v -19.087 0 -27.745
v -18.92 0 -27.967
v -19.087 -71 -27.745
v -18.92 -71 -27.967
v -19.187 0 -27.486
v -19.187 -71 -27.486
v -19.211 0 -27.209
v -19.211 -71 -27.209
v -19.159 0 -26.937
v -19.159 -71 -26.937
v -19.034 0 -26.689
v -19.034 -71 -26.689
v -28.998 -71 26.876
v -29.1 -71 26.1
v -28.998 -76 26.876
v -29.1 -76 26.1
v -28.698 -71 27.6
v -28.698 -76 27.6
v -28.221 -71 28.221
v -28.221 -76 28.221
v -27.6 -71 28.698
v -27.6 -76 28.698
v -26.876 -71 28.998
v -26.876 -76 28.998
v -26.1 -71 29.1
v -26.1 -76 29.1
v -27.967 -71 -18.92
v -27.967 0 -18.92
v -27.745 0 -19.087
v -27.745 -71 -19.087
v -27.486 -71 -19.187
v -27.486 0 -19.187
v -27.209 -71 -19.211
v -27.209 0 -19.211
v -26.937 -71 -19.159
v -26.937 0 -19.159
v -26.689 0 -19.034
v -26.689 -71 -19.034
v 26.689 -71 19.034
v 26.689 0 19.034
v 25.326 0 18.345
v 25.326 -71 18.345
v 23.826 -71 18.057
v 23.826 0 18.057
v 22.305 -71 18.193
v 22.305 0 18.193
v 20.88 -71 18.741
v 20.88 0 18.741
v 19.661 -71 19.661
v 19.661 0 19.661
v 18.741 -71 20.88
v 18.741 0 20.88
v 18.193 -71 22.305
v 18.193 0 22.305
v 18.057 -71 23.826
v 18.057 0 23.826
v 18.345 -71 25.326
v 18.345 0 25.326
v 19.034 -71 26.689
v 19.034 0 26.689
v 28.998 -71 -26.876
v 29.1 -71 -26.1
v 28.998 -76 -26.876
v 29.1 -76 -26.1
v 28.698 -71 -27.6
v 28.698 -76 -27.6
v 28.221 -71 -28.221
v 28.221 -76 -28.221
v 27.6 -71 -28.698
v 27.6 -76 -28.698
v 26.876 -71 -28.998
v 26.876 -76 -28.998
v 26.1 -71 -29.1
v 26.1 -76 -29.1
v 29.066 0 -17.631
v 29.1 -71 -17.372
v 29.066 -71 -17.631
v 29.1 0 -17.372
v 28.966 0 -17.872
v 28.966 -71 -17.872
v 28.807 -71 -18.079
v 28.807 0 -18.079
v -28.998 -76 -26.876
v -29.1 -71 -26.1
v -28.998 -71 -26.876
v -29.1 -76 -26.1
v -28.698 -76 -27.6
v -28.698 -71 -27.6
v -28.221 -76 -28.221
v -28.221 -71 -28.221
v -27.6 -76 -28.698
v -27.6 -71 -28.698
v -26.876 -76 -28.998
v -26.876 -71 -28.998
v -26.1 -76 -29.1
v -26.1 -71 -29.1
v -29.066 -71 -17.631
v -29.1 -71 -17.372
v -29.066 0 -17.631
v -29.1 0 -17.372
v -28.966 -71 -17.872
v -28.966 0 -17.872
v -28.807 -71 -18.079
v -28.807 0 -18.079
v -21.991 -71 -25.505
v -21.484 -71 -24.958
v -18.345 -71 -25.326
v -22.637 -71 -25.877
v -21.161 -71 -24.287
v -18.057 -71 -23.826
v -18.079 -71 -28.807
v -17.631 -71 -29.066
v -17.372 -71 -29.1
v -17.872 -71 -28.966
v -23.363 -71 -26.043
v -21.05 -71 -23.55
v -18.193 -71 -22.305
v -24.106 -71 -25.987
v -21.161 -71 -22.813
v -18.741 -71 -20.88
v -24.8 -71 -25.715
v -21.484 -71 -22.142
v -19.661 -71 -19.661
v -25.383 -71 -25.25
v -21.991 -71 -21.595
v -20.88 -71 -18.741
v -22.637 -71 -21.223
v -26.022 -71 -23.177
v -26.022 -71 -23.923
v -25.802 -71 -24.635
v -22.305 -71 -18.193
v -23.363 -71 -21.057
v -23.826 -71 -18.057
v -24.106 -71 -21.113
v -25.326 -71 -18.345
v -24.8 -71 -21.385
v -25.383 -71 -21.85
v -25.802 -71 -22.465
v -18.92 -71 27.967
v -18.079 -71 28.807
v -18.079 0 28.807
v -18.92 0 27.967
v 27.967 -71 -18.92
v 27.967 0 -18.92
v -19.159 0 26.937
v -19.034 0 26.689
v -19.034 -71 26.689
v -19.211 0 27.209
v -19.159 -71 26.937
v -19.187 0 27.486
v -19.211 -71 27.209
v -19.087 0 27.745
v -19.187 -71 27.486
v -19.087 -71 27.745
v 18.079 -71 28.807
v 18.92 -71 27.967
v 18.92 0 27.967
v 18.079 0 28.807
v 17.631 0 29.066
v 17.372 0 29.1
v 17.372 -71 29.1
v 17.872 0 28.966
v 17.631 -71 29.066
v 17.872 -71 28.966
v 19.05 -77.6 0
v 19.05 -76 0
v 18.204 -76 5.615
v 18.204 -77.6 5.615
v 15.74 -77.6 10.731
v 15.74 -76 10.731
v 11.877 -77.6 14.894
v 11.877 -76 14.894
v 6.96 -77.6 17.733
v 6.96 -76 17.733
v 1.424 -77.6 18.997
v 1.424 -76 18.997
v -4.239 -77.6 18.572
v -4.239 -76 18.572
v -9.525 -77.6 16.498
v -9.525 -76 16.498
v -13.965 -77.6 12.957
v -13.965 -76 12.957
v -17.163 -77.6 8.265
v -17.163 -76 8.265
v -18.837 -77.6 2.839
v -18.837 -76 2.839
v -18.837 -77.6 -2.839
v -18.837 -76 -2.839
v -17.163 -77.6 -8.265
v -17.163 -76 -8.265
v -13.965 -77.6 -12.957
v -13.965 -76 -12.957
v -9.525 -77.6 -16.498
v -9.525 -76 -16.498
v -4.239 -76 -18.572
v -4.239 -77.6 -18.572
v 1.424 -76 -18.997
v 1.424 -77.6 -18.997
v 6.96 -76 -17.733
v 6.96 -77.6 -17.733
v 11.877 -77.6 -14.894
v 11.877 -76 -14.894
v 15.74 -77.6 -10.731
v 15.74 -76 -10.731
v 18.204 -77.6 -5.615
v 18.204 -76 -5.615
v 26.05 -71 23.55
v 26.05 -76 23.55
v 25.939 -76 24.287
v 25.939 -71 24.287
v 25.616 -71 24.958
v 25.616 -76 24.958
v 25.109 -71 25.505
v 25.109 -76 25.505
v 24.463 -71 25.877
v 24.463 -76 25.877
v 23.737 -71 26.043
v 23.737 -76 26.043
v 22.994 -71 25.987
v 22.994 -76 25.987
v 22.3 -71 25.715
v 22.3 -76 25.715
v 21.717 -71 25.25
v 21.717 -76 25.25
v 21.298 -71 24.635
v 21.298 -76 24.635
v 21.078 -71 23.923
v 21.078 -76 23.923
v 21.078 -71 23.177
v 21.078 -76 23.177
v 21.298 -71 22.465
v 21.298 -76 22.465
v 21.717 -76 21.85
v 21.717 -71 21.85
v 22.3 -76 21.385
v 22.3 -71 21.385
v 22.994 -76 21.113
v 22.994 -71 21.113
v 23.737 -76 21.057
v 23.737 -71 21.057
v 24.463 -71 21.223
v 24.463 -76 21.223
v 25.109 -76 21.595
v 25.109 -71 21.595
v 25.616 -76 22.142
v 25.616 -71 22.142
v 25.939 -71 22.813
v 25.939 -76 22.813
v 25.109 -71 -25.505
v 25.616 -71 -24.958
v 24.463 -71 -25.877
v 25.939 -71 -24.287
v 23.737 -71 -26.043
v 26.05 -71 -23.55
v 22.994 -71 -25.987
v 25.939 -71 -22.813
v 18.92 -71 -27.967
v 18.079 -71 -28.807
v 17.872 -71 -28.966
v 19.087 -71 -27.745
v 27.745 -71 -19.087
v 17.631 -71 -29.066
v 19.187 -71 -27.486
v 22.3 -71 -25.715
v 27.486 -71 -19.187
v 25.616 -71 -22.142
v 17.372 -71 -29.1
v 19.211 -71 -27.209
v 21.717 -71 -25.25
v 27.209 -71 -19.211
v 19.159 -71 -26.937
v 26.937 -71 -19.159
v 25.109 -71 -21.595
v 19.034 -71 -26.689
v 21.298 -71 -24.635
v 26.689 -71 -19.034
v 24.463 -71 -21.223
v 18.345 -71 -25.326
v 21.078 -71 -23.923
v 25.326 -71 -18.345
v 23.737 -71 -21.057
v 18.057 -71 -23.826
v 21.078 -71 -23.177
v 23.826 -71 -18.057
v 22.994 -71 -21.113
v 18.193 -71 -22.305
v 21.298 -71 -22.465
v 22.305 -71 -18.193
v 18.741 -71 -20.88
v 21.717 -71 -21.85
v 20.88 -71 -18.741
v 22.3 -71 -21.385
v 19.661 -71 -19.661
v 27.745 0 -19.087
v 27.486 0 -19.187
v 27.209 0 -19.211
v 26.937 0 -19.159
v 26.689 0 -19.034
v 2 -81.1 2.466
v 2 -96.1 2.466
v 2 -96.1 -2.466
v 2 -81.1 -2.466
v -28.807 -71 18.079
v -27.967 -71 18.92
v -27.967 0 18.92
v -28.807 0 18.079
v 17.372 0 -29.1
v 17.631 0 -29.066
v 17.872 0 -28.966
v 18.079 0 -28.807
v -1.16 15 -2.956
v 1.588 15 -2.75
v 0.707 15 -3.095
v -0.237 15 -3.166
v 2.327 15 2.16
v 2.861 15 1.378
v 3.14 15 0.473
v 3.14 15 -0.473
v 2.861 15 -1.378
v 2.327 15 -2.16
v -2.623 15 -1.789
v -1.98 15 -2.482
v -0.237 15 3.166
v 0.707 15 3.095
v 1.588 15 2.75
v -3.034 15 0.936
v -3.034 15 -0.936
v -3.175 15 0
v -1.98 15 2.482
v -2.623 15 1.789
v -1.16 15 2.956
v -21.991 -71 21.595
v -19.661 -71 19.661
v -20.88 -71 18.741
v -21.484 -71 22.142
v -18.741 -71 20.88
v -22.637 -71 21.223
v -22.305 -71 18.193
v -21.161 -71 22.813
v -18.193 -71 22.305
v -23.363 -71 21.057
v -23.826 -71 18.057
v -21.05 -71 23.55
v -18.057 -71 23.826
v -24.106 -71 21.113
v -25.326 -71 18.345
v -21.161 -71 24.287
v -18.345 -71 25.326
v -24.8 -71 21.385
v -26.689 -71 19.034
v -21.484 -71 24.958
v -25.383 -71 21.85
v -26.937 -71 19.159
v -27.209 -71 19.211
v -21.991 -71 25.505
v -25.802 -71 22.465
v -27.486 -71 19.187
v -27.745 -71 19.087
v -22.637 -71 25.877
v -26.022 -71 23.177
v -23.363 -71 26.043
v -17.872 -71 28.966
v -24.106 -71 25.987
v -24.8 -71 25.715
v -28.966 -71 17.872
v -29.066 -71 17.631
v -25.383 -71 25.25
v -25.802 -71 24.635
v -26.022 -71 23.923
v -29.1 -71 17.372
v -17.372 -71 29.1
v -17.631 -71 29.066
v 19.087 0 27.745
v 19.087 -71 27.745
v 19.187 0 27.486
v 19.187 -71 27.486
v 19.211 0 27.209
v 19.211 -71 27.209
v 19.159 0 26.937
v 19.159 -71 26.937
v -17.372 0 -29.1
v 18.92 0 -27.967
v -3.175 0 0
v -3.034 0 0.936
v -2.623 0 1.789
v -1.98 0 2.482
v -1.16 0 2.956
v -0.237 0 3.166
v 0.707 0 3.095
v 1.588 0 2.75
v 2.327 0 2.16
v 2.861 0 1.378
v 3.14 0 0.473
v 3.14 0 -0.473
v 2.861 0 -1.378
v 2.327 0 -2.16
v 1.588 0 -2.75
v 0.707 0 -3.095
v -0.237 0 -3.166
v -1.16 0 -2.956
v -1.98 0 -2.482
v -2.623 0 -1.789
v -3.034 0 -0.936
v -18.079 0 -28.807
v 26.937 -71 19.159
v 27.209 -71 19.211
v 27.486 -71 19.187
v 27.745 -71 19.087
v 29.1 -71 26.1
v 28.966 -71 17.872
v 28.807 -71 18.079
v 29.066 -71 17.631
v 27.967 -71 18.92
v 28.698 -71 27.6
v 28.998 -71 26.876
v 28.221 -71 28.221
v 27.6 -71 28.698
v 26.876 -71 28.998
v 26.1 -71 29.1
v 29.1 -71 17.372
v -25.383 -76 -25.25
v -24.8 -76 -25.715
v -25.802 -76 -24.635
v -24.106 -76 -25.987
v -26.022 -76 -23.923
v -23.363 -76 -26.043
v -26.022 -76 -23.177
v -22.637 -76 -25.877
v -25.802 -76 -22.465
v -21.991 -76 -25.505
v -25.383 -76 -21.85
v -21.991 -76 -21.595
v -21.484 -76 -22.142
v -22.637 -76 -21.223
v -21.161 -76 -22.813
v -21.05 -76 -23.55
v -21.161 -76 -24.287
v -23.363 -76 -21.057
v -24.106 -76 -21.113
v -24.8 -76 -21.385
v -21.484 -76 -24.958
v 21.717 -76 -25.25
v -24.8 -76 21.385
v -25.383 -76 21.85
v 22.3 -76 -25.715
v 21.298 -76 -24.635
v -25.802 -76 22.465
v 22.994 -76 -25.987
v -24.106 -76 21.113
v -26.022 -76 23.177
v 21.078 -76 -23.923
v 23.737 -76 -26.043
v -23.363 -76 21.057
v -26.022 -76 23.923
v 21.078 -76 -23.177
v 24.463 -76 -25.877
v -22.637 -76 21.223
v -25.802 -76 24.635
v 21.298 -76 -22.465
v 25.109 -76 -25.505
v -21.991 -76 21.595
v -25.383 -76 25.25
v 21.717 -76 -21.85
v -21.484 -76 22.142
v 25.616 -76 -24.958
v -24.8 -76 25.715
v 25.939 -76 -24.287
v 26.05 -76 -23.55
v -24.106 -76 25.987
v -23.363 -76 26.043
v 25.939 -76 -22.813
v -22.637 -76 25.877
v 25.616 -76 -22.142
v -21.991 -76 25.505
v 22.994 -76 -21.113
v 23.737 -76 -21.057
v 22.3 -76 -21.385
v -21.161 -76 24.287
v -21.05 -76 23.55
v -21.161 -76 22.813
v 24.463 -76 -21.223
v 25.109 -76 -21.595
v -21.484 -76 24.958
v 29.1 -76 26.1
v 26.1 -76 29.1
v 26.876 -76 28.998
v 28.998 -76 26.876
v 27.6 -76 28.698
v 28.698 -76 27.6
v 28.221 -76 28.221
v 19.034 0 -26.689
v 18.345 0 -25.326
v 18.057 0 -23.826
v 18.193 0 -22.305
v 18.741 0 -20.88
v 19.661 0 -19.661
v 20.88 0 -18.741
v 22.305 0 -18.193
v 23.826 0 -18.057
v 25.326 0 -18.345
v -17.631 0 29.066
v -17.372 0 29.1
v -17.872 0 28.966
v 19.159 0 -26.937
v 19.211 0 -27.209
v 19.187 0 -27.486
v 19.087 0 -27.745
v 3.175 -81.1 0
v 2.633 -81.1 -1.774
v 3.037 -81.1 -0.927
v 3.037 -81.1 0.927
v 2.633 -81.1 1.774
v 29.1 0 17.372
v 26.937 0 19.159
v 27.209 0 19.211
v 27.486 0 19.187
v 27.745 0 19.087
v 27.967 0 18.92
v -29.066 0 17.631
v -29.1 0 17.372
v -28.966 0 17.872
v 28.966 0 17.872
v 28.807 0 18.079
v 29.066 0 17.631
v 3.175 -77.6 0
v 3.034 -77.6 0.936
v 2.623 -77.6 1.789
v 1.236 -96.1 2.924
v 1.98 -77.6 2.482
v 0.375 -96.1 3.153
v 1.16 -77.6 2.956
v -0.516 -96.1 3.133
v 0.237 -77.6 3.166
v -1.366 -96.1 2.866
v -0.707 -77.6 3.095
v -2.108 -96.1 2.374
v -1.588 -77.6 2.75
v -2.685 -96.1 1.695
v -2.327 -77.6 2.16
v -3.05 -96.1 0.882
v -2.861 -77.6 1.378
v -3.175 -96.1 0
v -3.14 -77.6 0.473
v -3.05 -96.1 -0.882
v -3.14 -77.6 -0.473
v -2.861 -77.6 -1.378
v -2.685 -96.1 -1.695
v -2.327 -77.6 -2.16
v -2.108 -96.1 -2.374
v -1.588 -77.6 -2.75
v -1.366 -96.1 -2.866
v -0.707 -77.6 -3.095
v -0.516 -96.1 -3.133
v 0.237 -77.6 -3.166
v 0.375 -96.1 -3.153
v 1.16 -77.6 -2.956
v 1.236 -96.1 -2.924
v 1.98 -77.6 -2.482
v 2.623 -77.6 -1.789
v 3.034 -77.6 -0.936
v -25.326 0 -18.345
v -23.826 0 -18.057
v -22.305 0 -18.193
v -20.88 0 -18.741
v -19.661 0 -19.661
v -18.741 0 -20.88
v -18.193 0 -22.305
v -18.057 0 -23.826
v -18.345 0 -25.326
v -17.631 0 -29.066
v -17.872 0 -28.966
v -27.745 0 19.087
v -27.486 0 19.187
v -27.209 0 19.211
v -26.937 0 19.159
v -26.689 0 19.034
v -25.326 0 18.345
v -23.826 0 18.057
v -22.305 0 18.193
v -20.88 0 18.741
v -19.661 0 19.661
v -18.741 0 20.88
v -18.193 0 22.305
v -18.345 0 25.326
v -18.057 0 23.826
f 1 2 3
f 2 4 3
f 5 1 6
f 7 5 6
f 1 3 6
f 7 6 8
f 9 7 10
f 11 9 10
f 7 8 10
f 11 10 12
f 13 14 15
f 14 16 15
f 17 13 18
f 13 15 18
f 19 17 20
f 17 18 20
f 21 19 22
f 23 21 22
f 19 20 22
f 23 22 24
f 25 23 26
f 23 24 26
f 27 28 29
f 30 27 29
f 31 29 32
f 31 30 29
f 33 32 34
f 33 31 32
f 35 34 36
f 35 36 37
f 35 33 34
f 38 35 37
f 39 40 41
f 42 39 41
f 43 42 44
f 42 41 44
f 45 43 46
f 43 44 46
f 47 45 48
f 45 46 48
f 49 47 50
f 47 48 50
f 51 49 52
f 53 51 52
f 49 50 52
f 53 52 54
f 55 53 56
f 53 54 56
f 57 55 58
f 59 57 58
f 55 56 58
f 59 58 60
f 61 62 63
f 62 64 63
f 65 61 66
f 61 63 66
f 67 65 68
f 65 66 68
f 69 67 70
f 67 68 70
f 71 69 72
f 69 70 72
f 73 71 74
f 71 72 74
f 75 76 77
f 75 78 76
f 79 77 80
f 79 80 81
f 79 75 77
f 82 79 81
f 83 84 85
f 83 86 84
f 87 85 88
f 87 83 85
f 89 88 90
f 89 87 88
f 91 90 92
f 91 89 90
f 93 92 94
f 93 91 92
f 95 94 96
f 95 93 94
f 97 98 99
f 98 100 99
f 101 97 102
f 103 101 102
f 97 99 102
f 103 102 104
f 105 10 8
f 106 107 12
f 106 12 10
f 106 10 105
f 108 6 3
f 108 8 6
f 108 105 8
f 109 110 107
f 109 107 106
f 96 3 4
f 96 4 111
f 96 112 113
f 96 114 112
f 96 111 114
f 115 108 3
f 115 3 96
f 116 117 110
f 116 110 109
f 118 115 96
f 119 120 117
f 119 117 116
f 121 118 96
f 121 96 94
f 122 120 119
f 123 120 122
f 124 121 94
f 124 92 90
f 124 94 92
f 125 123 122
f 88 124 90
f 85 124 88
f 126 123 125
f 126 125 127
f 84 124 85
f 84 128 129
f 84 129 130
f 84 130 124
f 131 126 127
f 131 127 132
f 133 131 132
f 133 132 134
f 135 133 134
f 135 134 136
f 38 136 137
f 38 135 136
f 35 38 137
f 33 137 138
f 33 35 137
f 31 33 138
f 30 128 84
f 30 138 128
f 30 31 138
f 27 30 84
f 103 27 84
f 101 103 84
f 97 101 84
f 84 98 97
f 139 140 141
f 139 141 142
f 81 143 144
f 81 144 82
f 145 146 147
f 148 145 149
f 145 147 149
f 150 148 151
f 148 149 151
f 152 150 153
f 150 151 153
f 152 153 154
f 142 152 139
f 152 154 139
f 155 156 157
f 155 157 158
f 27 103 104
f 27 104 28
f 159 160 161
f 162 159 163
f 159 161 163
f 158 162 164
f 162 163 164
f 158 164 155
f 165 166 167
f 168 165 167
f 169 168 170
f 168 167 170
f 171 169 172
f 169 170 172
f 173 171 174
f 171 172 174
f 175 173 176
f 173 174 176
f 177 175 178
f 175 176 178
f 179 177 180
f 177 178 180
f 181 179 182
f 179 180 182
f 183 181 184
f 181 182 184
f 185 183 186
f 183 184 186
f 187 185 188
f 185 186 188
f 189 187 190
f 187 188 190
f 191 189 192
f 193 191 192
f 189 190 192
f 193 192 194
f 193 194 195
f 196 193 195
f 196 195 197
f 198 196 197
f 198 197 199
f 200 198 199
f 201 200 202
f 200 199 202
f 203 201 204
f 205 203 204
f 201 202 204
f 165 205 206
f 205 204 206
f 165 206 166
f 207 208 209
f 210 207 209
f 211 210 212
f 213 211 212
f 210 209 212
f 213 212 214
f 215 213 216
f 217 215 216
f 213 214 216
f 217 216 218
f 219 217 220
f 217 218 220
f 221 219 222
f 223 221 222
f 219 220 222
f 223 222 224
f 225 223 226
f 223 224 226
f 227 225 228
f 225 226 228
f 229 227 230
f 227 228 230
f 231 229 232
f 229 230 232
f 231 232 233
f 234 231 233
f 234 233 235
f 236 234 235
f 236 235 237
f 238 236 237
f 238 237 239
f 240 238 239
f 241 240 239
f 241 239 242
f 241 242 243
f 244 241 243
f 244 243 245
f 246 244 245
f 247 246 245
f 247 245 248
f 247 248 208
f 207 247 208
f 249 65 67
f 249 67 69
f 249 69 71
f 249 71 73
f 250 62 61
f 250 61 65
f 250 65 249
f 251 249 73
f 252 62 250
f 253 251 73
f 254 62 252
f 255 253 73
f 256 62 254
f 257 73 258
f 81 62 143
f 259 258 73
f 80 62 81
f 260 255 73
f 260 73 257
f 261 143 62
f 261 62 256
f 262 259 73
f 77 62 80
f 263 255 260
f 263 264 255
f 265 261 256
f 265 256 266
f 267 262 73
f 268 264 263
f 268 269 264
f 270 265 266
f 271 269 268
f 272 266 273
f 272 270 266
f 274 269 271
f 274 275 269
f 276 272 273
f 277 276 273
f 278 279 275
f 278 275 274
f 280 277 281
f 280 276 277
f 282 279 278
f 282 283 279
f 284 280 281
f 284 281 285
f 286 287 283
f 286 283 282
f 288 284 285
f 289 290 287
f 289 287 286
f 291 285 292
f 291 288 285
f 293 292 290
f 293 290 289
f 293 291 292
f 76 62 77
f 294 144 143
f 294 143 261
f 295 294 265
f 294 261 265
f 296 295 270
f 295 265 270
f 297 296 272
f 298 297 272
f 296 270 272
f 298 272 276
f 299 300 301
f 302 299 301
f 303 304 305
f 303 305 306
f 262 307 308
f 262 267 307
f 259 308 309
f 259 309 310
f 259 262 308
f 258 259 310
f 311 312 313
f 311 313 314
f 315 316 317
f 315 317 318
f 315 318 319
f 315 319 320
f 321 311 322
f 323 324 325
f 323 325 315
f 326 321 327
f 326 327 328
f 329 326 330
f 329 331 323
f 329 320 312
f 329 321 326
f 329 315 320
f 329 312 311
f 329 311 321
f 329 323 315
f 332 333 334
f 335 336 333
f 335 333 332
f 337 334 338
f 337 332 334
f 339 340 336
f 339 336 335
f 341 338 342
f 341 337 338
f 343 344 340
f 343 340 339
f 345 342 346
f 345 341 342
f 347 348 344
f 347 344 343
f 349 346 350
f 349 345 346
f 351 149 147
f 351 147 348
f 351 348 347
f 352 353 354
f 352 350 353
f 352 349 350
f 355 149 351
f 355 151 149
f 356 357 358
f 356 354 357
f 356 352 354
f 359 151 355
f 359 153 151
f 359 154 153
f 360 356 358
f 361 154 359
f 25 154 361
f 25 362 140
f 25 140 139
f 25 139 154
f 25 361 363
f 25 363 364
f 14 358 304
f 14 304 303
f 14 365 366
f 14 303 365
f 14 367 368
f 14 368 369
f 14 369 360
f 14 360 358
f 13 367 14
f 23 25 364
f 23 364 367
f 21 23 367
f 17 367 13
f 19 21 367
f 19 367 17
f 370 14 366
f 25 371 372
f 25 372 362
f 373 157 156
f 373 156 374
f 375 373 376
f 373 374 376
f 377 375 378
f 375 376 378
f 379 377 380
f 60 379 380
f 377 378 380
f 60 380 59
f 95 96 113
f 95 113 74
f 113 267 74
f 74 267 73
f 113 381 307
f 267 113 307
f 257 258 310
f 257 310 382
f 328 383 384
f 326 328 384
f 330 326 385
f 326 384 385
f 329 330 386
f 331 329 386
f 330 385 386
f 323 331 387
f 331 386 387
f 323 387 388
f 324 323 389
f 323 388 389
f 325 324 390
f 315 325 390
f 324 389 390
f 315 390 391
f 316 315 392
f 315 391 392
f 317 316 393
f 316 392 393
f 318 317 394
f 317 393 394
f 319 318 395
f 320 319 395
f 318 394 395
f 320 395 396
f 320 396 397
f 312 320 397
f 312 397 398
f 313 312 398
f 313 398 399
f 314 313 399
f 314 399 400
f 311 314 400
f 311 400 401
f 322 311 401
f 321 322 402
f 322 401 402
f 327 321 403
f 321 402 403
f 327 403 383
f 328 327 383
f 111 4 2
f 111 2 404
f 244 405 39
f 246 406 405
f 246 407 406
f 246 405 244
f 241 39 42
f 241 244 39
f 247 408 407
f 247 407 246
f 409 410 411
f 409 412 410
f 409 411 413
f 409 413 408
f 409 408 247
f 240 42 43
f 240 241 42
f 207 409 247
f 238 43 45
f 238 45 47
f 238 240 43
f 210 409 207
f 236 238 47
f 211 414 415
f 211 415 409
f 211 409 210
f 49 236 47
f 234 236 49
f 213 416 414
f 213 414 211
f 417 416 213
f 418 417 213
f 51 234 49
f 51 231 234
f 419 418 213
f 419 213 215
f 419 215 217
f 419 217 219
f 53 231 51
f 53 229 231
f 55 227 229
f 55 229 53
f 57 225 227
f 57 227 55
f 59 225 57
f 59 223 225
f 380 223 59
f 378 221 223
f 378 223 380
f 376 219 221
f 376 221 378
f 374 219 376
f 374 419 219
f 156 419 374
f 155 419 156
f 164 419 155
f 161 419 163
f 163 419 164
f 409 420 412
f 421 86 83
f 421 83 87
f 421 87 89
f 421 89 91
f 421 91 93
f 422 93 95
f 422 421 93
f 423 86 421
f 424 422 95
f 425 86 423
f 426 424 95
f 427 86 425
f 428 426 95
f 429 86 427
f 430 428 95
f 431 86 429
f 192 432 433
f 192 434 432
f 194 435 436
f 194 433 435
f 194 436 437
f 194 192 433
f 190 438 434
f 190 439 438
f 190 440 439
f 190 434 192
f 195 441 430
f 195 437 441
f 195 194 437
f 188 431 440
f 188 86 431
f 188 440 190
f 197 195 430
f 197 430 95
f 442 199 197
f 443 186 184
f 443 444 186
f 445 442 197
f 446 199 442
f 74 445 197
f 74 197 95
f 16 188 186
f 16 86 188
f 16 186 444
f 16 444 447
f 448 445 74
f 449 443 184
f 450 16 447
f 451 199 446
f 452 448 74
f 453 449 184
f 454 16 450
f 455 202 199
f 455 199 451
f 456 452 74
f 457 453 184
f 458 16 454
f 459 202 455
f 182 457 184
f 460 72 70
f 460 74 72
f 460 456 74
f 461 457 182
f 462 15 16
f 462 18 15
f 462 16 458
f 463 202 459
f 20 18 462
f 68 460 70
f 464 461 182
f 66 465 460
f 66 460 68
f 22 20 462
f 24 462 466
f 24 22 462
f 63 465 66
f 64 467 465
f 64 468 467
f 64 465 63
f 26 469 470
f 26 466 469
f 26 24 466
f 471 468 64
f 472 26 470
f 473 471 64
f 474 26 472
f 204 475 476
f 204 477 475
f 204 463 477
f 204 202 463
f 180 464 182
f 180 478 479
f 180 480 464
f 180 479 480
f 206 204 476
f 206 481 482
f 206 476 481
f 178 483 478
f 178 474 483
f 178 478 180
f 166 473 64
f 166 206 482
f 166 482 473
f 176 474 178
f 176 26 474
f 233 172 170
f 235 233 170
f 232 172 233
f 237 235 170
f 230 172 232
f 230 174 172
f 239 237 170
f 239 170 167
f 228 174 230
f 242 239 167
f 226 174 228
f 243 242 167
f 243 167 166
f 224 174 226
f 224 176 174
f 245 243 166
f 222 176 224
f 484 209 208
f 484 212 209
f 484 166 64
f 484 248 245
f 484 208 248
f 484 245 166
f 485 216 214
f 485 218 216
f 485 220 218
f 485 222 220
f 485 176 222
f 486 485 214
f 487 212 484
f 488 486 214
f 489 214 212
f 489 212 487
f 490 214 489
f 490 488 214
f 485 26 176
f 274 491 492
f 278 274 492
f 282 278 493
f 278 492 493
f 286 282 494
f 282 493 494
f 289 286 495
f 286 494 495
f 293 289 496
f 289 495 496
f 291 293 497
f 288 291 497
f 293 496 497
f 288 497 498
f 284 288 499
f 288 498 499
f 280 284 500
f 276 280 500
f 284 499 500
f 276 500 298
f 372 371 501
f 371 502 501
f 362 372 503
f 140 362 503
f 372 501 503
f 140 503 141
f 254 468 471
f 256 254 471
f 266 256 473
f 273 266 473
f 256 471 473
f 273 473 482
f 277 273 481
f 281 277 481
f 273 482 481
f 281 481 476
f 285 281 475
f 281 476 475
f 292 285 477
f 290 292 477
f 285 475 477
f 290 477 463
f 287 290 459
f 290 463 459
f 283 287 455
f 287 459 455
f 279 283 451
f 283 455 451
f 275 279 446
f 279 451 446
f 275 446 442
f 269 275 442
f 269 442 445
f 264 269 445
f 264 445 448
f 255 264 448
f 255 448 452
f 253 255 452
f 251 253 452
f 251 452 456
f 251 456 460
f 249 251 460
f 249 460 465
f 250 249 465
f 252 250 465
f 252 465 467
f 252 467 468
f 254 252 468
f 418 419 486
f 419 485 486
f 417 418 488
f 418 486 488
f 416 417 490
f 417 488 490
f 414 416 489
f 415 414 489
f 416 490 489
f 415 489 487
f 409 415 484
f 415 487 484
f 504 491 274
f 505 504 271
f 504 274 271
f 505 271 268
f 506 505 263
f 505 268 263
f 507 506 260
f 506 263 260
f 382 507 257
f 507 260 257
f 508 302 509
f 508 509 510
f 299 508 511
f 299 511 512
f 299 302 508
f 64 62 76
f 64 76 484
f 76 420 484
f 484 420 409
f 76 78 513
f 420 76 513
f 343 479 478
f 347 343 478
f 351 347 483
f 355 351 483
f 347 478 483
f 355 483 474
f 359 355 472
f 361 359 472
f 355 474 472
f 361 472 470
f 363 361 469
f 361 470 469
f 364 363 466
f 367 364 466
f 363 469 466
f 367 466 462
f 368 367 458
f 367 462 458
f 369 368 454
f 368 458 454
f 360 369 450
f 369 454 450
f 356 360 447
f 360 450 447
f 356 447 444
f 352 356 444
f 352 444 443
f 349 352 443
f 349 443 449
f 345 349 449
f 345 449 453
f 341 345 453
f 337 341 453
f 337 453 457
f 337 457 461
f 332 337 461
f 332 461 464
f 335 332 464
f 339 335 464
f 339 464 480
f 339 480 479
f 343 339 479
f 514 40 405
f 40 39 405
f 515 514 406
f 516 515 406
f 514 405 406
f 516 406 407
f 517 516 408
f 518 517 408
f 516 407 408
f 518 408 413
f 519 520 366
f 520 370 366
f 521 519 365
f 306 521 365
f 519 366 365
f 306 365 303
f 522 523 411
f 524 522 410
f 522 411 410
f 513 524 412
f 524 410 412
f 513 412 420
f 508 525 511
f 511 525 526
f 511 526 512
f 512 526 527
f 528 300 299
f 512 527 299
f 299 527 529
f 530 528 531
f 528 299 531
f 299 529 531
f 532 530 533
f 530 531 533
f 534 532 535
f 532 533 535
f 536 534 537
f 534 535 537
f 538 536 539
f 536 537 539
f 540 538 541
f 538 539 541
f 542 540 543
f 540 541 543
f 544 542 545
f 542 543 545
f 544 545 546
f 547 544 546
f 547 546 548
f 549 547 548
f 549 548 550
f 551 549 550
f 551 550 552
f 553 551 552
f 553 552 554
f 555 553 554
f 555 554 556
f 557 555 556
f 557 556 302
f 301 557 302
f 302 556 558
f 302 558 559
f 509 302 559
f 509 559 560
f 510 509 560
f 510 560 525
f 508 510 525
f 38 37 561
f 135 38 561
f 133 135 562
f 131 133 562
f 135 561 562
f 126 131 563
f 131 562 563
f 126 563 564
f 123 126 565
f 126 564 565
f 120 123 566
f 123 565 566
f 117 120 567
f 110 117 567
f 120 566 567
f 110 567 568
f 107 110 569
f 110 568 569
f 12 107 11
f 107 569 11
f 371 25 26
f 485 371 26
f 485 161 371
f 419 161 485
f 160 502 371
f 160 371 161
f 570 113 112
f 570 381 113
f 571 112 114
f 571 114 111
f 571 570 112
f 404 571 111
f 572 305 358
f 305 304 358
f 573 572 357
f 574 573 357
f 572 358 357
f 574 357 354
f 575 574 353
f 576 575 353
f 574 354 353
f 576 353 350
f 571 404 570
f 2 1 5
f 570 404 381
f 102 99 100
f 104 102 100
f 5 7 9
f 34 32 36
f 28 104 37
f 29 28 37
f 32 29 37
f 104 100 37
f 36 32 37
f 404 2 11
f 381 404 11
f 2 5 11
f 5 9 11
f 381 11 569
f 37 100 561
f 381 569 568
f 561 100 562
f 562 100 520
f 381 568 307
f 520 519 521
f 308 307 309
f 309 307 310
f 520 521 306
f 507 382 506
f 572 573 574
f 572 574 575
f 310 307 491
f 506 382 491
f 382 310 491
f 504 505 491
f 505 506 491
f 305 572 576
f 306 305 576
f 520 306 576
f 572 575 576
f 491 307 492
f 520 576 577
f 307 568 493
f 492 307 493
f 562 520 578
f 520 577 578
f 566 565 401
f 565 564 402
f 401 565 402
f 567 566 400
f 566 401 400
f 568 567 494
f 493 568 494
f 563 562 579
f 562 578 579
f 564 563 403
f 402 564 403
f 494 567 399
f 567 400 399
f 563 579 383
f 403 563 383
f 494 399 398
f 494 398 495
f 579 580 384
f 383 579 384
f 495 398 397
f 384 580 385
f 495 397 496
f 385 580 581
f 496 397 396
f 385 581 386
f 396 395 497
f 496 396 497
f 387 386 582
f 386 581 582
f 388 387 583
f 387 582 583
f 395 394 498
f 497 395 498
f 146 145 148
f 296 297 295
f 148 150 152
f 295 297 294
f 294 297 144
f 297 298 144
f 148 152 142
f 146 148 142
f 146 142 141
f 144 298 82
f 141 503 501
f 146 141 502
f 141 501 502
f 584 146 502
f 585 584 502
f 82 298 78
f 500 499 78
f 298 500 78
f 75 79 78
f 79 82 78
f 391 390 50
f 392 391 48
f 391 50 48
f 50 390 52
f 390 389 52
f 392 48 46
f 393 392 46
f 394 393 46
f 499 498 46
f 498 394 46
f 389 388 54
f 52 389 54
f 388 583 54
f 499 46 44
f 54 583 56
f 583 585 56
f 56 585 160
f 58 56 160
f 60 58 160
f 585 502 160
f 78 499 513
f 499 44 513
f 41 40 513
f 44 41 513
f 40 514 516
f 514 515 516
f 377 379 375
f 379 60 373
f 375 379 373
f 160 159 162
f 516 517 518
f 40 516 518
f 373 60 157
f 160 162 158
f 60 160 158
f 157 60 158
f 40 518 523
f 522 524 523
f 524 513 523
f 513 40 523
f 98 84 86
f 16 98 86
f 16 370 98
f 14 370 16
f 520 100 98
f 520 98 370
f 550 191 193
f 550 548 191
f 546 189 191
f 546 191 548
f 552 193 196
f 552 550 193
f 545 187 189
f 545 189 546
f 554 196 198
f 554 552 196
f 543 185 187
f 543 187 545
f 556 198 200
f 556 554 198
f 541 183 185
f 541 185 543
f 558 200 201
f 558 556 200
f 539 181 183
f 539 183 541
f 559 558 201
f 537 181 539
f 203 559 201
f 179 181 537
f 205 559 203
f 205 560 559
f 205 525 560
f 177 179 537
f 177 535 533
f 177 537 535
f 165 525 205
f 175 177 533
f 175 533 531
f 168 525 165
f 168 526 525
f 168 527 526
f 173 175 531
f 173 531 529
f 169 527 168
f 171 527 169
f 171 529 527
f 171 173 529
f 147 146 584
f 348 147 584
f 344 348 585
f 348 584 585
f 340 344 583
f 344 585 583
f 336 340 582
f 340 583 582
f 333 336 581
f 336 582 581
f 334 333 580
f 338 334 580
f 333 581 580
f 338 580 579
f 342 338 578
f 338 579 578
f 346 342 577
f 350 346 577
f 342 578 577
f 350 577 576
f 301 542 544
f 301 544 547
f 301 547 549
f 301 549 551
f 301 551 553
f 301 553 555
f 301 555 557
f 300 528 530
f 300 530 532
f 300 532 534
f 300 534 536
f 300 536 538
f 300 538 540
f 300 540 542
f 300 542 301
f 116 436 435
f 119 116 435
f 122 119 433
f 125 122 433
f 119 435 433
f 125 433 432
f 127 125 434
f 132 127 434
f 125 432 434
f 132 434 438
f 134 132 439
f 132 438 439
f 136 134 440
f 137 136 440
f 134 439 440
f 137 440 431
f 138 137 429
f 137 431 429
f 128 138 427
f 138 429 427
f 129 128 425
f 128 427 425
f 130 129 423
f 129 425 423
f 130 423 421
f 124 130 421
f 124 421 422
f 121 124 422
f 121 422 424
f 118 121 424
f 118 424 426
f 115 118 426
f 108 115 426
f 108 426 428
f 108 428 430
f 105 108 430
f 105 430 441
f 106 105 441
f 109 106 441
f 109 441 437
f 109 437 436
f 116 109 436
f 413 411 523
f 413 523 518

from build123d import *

# Parameters (mm, degrees)
F0_W      = 58.2
F0_H      = 58.2
F1_DEPTH  = 76
F2_R      = 2.5
F3_DEPTH  = 25
F4_W      = 154.9799069762
F4_H      = 154.0232300758
F5_DEPTH  = 71
F6_R      = 1
F7_R      = 3
F8_R      = 19.05
F9_DEPTH  = 1.6
F10_R     = 3.175
F11_DEPTH = 18.5
F13_DEPTH = 15
F14_R     = 3.175
F15_DEPTH = 15


with BuildPart() as f1:
    # F0 (on Front) → F1 (new body)
    with BuildSketch(Plane.XZ):
        Rectangle(F0_W, F0_H)
    extrude(amount=F1_DEPTH)

    # F2 (on face) → F3 (cut)
    with BuildSketch(Plane.XZ.offset(76)):
        with Locations((23.55, 23.55)):
            Circle(F2_R)
        with Locations((23.55, -23.55)):
            Circle(F2_R)
        with Locations((-23.55, -23.55)):
            Circle(F2_R)
        with Locations((-23.55, 23.55)):
            Circle(F2_R)
    extrude(amount=-F3_DEPTH, mode=Mode.SUBTRACT)

    # F4 (on face) → F5 (cut)
    with BuildSketch(Plane(origin=(0, 0, 0), x_dir=(-1, 0, 0), z_dir=(0, 1, 0))):
        with Locations((-0.8317120373, 1.2900978327)):
            Rectangle(F4_W, F4_H)
        with BuildLine():
            Line((27.330764838, 19.555526663), (46.886291501, 0))
            Line((46.886291501, 0), (27.330764838, -19.555526663))
            ThreePointArc((27.330764838, -19.555526663), (19.6609127035, -19.6609127035), (19.555526663, -27.330764838))
            Line((19.555526663, -27.330764838), (0, -46.886291501))
            Line((0, -46.886291501), (-19.555526663, -27.330764838))
            ThreePointArc((-19.555526663, -27.330764838), (-19.6609127035, -19.6609127035), (-27.330764838, -19.555526663))
            Line((-27.330764838, -19.555526663), (-46.886291501, 0))
            Line((-46.886291501, 0), (-27.330764838, 19.555526663))
            ThreePointArc((-27.330764838, 19.555526663), (-19.6609127035, 19.6609127035), (-19.555526663, 27.330764838))
            Line((-19.555526663, 27.330764838), (0, 46.886291501))
            Line((0, 46.886291501), (19.555526663, 27.330764838))
            ThreePointArc((19.555526663, 27.330764838), (19.6609127035, 19.6609127035), (27.330764838, 19.555526663))
        make_face(mode=Mode.SUBTRACT)
    extrude(amount=-F5_DEPTH, mode=Mode.SUBTRACT)

    # F6
    f6_edges = [f1.edges().sort_by_distance(p)[0] for p in [
        (-29.1, -35.5, 17.786292),
        (-17.786292, -35.5, 29.1),
        (-19.555527, -35.5, 27.330765),
        (-27.330765, -35.5, 19.555527),
        (-29.1, -35.5, -17.786292),
        (-27.330765, -35.5, -19.555527),
        (-17.786292, -35.5, -29.1),
        (-19.555527, -35.5, -27.330765),
        (17.786292, -35.5, -29.1),
        (19.555527, -35.5, -27.330765),
        (27.330765, -35.5, -19.555527),
        (29.1, -35.5, -17.786292),
        (27.330765, -35.5, 19.555527),
        (29.1, -35.5, 17.786292),
        (19.555527, -35.5, 27.330765),
        (17.786292, -35.5, 29.1),
    ]]
    fillet(f6_edges, radius=F6_R)

    # F7
    f7_edges = [f1.edges().sort_by_distance(p)[0] for p in [
        (-29.1, -73.5, -29.1),
        (-29.1, -73.5, 29.1),
        (29.1, -73.5, -29.1),
        (29.1, -73.5, 29.1),
    ]]
    fillet(f7_edges, radius=F7_R)

    # F8 (on face) → F9 (join)
    with BuildSketch(Plane.XZ.offset(76)):
        Circle(F8_R)
    extrude(amount=F9_DEPTH)

    # F10 (on face) → F11 (join)
    with BuildSketch(Plane.XZ.offset(77.6)):
        Circle(F10_R)
    extrude(amount=F11_DEPTH)

    # F12 (on face) → F13 (cut)
    with BuildSketch(Plane.XZ.offset(96.1)):
        with BuildLine():
            ThreePointArc((3.175, 0), (2.8662366441, 1.365764438), (2, 2.4658923334))
            Line((2, 2.4658923334), (2, -2.4658923334))
            ThreePointArc((2, -2.4658923334), (2.8662366441, -1.365764438), (3.175, 0))
        make_face()
    extrude(amount=-F13_DEPTH, mode=Mode.SUBTRACT)

    # F14 (on face) → F15 (join)
    with BuildSketch(Plane(origin=(0, 0, 0), x_dir=(-1, 0, 0), z_dir=(0, 1, 0))):
        Circle(F14_R)
    extrude(amount=F15_DEPTH)


solid = f1.part
